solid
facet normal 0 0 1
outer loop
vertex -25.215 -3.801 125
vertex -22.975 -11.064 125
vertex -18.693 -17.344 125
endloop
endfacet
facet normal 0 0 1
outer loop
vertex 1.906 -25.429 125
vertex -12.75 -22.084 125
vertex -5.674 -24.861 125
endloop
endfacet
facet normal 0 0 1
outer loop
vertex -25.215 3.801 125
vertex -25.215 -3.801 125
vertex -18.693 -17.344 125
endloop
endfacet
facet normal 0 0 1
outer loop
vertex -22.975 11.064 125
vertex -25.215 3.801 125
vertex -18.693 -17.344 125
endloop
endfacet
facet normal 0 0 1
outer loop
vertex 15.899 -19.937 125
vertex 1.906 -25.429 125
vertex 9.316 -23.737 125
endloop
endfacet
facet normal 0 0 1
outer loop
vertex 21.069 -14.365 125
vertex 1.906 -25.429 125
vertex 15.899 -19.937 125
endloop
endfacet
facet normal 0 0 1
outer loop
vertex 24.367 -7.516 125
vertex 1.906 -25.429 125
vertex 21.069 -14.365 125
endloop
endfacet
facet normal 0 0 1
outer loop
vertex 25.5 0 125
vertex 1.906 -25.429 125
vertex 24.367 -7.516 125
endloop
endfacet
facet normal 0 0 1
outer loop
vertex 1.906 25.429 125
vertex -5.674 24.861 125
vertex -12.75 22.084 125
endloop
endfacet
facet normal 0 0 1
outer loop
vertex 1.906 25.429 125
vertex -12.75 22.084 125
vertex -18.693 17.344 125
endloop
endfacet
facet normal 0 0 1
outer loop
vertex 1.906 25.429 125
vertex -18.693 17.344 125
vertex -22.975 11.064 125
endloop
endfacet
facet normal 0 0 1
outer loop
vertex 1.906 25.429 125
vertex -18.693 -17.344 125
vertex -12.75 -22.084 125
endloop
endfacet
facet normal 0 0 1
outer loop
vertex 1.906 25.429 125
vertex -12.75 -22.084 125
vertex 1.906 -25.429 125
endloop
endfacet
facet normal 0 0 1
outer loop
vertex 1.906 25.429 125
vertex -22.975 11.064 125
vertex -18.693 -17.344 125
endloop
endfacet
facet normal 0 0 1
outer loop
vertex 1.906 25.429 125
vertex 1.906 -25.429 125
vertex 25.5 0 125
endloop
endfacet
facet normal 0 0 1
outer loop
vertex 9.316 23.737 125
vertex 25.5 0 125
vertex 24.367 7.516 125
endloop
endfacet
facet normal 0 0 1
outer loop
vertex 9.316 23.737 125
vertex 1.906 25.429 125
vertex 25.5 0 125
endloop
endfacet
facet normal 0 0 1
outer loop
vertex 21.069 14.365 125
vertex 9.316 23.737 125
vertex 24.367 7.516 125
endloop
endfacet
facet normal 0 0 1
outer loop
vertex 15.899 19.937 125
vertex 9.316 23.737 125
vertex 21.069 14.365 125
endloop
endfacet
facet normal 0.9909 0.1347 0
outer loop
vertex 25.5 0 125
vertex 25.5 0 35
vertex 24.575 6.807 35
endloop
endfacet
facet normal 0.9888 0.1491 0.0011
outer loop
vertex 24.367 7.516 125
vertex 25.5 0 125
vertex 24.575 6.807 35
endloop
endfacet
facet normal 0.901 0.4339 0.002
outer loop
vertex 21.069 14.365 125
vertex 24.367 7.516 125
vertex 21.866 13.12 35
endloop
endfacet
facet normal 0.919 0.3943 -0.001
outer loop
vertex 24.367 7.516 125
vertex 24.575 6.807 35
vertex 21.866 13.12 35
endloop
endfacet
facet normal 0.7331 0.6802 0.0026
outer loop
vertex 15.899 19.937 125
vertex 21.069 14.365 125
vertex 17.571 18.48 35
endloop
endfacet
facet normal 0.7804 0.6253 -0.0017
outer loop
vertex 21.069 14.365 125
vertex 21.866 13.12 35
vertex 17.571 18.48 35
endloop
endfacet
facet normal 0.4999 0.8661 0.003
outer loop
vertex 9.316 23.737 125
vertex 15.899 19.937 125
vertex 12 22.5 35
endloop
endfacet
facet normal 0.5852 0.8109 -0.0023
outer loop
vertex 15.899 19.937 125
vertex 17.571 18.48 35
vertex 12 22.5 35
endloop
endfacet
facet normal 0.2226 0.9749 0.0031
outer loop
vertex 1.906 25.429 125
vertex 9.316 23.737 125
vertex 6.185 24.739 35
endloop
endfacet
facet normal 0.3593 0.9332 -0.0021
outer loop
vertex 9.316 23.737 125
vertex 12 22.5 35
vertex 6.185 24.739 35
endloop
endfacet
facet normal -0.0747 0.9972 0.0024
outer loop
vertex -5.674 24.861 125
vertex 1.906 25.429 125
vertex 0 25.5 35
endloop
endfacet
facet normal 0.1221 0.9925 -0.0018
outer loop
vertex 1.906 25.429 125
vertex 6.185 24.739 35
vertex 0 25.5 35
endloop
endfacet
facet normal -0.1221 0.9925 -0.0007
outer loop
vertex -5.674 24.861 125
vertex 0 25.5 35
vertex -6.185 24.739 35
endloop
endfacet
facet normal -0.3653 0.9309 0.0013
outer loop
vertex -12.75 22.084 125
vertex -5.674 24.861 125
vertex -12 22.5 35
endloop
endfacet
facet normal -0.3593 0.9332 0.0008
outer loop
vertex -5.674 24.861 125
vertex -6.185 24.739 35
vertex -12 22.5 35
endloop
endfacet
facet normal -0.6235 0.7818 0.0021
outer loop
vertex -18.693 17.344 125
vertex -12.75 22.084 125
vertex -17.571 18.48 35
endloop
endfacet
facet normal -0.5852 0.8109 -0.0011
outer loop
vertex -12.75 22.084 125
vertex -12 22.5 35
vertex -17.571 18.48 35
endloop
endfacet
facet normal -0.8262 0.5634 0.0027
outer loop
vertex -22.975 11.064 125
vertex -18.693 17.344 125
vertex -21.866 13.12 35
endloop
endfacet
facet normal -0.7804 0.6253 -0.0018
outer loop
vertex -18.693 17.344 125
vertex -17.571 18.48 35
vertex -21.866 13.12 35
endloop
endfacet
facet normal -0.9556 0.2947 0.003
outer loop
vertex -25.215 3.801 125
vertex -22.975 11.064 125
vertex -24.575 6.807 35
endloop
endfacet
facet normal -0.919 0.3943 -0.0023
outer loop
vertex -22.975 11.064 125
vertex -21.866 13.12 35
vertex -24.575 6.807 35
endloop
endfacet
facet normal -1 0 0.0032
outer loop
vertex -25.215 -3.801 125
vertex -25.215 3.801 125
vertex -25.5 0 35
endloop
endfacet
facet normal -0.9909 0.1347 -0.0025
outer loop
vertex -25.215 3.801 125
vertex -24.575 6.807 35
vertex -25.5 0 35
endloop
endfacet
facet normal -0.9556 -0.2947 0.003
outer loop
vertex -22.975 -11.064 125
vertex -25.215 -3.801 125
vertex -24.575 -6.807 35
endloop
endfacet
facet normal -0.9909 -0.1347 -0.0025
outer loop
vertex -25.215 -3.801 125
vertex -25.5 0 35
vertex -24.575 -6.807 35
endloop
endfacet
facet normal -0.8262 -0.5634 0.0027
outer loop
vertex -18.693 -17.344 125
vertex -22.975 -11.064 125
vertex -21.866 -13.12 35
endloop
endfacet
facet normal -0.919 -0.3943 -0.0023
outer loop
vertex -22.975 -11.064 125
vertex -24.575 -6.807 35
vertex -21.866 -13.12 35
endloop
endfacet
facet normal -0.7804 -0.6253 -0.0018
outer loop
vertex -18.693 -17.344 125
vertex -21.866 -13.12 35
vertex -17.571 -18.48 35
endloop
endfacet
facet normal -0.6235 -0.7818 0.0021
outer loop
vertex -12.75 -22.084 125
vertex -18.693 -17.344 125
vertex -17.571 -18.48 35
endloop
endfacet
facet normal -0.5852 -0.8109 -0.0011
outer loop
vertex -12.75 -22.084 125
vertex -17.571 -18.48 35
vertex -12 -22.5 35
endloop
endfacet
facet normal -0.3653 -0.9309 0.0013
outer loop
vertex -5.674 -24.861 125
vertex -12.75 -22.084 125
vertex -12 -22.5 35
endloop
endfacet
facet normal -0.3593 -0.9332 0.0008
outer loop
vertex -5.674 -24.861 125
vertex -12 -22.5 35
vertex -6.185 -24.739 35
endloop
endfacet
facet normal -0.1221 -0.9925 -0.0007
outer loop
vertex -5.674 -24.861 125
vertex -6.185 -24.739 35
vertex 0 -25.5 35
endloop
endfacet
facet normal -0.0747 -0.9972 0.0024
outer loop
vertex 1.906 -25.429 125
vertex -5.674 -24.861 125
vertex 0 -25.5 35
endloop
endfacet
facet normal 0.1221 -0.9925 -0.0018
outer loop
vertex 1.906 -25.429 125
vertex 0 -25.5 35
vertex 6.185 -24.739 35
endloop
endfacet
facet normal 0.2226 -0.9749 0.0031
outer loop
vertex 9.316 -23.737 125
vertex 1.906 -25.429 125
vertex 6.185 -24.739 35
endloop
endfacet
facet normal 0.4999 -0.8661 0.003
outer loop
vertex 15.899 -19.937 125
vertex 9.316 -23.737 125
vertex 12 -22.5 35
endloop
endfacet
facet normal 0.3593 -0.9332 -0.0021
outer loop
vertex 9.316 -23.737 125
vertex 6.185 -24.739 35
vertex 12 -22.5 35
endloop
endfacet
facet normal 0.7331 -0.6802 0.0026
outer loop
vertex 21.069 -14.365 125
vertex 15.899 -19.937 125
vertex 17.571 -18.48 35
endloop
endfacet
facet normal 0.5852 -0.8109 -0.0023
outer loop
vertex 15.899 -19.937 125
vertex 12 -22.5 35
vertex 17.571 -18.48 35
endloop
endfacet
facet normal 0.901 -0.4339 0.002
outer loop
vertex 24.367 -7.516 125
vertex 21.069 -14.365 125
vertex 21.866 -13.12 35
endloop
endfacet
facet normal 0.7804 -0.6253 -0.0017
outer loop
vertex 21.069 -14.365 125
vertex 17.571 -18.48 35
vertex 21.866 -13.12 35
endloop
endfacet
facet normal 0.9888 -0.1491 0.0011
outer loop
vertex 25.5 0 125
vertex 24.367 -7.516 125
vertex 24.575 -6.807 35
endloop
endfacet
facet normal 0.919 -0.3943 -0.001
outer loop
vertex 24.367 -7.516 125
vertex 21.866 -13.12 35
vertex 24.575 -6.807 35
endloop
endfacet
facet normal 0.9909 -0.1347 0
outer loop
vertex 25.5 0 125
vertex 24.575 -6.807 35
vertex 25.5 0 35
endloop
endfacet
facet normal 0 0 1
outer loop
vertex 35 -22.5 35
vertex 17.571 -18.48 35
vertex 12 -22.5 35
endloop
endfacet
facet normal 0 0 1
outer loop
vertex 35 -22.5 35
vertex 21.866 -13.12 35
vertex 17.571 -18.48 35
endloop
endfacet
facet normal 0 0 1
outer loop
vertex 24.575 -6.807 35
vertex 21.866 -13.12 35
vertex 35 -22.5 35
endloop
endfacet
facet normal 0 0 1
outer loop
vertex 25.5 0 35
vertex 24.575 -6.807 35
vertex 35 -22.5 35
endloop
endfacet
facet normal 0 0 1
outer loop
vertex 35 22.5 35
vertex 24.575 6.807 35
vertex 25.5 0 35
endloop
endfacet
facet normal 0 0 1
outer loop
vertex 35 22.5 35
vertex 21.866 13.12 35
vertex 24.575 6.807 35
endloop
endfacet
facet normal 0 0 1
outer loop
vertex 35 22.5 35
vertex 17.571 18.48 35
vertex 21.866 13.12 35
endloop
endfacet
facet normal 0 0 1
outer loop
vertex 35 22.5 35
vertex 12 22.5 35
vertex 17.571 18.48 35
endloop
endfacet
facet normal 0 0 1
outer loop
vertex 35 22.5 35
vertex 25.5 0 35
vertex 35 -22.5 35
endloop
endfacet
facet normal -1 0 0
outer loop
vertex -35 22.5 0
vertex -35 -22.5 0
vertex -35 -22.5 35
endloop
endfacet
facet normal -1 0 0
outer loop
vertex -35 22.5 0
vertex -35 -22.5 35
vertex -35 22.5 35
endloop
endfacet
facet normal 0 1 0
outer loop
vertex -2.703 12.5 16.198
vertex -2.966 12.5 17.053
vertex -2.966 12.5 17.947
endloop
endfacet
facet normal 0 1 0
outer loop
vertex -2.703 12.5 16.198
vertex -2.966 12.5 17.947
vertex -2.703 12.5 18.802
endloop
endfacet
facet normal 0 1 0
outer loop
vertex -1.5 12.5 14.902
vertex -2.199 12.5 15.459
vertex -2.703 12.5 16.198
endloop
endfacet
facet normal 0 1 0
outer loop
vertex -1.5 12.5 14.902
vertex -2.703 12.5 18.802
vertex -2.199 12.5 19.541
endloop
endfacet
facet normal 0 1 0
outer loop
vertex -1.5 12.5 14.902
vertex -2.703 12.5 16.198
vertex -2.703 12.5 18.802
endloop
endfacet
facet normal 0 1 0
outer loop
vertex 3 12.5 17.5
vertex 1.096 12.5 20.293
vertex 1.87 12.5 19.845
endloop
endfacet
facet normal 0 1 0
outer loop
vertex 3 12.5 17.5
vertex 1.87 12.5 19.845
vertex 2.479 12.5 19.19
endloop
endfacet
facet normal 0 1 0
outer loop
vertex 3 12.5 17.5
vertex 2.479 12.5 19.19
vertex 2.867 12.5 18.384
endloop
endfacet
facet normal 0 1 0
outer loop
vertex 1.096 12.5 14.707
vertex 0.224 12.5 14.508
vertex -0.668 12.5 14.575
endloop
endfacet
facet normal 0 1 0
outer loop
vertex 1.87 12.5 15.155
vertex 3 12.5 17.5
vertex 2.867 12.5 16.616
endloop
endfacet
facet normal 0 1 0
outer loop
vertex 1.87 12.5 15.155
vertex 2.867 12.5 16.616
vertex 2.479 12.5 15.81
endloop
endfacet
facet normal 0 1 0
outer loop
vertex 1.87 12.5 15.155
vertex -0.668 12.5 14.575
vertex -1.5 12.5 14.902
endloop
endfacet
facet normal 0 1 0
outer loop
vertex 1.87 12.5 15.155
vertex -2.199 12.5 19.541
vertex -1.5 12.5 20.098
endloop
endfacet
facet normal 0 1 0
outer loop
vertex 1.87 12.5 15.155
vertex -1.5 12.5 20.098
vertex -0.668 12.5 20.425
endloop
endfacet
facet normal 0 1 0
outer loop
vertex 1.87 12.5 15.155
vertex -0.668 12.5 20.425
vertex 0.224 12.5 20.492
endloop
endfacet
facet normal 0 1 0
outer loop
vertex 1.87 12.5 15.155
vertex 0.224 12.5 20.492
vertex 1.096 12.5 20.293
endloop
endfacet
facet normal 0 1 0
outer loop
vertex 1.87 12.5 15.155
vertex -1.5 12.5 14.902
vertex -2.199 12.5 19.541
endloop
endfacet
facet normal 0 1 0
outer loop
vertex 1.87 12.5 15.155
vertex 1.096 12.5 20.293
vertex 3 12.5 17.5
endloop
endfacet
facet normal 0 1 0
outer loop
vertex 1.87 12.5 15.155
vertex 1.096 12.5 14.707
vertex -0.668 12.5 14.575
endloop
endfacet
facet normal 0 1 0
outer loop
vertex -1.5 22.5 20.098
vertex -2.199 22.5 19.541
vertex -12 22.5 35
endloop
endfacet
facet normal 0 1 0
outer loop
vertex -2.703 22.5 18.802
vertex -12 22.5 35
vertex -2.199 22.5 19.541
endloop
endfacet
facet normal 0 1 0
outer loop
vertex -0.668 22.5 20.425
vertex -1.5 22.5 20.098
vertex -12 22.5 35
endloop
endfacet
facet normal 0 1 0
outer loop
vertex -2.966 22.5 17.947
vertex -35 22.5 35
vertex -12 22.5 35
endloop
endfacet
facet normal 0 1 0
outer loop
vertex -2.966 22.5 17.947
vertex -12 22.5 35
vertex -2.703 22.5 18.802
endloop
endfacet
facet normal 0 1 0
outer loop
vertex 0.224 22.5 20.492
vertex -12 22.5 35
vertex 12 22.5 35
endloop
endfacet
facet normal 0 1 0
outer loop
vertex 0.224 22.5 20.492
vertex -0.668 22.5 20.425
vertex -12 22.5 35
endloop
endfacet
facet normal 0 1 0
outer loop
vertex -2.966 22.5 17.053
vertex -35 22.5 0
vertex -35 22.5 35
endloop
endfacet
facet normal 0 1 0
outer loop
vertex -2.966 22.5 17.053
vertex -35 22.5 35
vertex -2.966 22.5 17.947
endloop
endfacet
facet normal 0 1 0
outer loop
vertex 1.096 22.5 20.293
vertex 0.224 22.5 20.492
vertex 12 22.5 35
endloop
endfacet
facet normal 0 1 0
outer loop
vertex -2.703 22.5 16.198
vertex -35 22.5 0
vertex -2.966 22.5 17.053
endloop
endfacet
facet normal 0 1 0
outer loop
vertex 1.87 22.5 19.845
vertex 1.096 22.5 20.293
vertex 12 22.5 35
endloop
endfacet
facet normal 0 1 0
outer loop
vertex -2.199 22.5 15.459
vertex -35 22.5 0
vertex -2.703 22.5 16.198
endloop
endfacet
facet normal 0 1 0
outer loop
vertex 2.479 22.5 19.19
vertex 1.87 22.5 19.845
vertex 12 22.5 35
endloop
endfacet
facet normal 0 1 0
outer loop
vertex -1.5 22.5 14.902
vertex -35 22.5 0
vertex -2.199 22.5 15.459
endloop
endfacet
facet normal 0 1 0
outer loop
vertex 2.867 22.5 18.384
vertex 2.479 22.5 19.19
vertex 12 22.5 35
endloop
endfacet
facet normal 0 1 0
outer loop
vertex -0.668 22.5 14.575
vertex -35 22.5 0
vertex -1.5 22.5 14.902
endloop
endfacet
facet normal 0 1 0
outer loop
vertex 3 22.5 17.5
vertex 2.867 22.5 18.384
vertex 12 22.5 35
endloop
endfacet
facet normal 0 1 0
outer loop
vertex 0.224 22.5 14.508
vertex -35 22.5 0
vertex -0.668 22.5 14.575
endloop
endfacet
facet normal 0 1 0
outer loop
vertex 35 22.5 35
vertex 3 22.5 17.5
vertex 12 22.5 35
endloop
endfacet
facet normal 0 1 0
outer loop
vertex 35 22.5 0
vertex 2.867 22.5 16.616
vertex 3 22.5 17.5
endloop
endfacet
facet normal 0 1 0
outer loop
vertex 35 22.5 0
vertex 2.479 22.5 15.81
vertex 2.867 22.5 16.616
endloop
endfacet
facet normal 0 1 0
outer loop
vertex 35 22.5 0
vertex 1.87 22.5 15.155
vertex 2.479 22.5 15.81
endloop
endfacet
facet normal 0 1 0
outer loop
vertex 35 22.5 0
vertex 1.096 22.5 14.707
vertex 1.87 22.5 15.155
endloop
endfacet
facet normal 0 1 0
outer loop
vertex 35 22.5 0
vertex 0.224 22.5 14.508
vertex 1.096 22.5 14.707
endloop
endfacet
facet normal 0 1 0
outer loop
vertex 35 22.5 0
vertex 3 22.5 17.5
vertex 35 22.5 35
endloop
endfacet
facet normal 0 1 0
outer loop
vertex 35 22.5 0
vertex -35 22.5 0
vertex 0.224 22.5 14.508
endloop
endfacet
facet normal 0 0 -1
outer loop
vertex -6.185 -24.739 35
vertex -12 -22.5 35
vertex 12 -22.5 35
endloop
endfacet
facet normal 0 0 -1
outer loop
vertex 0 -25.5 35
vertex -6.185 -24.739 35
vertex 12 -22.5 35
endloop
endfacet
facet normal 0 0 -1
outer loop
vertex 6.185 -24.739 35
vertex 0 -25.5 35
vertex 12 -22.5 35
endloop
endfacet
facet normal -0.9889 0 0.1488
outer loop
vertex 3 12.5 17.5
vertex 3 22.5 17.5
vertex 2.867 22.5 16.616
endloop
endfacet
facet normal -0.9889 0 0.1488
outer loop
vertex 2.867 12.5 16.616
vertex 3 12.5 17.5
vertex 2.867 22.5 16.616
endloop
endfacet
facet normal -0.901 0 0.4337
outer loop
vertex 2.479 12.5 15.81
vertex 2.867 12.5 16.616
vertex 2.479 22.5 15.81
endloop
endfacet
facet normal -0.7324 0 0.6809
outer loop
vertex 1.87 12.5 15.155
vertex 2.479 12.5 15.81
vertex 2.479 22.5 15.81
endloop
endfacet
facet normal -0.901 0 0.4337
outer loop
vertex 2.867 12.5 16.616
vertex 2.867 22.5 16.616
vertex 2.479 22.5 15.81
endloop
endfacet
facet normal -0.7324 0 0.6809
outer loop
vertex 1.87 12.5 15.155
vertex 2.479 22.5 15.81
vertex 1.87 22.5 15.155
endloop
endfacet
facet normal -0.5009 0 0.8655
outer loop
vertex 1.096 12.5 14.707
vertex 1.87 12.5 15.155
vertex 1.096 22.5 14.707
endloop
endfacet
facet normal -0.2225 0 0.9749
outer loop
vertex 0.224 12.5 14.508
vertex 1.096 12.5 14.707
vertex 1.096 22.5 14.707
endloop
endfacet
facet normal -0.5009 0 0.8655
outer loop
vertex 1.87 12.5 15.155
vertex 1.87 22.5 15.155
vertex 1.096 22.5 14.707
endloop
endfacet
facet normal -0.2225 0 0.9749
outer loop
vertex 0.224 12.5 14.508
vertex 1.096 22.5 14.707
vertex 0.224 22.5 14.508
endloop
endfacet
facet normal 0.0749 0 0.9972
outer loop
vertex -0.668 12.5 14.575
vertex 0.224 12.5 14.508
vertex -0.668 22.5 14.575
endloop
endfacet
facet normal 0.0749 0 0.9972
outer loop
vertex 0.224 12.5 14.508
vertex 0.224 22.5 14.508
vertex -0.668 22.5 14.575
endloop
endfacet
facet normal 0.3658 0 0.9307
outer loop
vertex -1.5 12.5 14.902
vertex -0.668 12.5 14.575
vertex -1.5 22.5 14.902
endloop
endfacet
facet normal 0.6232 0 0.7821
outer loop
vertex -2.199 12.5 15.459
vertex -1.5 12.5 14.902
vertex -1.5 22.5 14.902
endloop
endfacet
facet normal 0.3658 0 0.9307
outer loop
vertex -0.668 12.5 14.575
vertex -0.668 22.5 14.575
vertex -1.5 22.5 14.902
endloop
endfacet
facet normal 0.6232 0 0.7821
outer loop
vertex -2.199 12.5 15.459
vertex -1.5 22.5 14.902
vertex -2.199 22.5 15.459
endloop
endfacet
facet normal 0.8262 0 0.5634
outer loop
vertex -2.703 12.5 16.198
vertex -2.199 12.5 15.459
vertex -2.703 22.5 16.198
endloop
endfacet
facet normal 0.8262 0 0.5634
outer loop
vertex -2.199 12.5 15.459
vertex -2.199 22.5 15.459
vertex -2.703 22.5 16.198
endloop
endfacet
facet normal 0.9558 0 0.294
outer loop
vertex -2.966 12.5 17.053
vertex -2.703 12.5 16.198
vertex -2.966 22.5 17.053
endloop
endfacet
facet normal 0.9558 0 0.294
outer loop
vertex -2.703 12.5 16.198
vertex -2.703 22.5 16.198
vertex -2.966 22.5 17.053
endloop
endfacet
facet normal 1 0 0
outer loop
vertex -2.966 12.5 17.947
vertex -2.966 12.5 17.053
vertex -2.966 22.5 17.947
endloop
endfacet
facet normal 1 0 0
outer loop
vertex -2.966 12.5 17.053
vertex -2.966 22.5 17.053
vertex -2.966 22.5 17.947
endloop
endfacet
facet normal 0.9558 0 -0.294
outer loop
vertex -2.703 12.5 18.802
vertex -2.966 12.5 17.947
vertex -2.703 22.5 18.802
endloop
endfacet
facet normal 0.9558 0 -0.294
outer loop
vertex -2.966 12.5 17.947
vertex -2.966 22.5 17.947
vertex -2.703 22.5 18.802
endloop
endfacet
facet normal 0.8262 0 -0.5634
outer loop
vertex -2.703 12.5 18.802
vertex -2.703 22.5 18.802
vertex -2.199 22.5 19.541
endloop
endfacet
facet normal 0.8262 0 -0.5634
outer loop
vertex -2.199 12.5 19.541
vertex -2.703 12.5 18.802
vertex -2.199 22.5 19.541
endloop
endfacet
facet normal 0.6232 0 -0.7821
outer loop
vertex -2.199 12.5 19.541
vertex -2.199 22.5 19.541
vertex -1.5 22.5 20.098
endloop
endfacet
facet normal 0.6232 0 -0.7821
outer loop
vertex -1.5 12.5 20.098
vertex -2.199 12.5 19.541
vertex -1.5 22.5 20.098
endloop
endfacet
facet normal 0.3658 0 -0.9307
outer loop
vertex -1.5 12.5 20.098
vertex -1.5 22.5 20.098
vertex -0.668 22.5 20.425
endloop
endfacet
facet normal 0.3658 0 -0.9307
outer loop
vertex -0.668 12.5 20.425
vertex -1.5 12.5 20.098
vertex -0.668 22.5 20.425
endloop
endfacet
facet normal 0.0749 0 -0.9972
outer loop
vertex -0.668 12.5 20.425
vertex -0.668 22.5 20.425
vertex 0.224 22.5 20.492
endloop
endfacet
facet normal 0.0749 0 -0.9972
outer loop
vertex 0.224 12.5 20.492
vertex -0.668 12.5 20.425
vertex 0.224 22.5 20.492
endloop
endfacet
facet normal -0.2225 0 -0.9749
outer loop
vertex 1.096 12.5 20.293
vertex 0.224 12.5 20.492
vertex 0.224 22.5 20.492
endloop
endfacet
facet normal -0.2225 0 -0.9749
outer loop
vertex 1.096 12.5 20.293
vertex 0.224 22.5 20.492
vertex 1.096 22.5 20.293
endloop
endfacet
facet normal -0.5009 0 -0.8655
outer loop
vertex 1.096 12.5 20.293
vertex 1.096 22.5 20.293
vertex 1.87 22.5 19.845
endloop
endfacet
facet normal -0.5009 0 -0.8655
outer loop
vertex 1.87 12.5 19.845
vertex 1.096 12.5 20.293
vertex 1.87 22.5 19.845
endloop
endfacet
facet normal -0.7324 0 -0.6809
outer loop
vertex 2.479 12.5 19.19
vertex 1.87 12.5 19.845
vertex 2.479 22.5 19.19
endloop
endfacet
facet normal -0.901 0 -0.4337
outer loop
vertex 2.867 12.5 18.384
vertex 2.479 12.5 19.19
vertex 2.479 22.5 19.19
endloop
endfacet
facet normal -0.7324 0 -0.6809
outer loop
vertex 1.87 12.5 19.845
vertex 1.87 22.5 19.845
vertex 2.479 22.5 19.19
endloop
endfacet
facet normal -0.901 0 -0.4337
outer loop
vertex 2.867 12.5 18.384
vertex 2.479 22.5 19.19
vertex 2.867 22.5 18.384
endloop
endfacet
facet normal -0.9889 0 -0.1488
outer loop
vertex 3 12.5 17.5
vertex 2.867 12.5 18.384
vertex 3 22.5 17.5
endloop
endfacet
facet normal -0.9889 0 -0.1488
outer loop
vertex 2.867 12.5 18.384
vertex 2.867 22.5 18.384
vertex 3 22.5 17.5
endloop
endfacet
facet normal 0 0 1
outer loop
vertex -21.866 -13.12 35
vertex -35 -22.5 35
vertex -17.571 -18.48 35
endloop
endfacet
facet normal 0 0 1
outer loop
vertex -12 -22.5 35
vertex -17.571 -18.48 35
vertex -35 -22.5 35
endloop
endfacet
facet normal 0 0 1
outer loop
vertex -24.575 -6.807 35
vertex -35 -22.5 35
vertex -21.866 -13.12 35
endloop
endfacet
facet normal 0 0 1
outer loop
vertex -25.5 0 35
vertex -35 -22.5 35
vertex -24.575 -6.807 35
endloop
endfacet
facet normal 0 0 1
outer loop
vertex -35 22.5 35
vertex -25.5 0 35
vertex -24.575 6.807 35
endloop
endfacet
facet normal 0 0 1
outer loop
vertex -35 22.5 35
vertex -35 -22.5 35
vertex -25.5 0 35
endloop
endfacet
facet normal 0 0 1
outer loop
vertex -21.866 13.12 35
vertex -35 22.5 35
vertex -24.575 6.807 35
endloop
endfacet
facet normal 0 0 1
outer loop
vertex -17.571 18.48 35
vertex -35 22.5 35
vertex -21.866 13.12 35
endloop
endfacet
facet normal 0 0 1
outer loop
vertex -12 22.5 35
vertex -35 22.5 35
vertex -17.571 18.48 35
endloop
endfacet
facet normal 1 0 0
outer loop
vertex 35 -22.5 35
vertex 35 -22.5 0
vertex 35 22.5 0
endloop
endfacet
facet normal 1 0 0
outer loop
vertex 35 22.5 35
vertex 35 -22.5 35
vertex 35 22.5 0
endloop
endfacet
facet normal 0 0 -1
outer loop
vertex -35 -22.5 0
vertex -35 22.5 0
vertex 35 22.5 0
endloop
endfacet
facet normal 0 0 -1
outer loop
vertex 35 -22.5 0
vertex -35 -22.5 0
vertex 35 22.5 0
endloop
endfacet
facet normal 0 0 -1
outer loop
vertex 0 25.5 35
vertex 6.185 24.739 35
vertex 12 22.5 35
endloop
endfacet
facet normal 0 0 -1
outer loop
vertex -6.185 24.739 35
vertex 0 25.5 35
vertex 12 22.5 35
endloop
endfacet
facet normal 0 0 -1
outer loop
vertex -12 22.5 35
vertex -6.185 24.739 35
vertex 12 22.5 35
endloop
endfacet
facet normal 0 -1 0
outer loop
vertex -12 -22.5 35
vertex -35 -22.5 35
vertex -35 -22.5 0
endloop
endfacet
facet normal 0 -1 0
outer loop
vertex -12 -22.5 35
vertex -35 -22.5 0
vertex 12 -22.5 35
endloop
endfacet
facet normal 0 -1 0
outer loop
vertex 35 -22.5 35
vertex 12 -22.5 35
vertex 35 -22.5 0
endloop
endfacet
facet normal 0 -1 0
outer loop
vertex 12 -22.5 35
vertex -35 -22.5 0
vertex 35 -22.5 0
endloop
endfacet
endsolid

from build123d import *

# Parameters (mm, degrees)
SKETCH1_W           = 70
SKETCH1_H           = 45
BOSS_EXTRUDE1_DEPTH = 35
SKETCH2_R           = 25.5
BOSS_EXTRUDE2_DEPTH = 90
SKETCH3_R           = 3
CUT_EXTRUDE1_DEPTH  = 10


with BuildPart() as part:
    # Sketch1 → Boss-Extrude1 (new body)
    with BuildSketch(Plane.XY):
        Rectangle(SKETCH1_W, SKETCH1_H)
    extrude(amount=BOSS_EXTRUDE1_DEPTH)

    # Sketch2 → Boss-Extrude2 (add)
    with BuildSketch(Plane.XY.offset(35)):
        Circle(SKETCH2_R)
    extrude(amount=BOSS_EXTRUDE2_DEPTH)

    # Sketch3 → Cut-Extrude1 (cut)
    with BuildSketch(Plane(origin=(0, 22.5, 0), x_dir=(1, 0, 0), z_dir=(0, 1, 0))):
        with Locations((0, -17.5)):
            Circle(SKETCH3_R)
    extrude(amount=-CUT_EXTRUDE1_DEPTH, mode=Mode.SUBTRACT)


solid = part.part
